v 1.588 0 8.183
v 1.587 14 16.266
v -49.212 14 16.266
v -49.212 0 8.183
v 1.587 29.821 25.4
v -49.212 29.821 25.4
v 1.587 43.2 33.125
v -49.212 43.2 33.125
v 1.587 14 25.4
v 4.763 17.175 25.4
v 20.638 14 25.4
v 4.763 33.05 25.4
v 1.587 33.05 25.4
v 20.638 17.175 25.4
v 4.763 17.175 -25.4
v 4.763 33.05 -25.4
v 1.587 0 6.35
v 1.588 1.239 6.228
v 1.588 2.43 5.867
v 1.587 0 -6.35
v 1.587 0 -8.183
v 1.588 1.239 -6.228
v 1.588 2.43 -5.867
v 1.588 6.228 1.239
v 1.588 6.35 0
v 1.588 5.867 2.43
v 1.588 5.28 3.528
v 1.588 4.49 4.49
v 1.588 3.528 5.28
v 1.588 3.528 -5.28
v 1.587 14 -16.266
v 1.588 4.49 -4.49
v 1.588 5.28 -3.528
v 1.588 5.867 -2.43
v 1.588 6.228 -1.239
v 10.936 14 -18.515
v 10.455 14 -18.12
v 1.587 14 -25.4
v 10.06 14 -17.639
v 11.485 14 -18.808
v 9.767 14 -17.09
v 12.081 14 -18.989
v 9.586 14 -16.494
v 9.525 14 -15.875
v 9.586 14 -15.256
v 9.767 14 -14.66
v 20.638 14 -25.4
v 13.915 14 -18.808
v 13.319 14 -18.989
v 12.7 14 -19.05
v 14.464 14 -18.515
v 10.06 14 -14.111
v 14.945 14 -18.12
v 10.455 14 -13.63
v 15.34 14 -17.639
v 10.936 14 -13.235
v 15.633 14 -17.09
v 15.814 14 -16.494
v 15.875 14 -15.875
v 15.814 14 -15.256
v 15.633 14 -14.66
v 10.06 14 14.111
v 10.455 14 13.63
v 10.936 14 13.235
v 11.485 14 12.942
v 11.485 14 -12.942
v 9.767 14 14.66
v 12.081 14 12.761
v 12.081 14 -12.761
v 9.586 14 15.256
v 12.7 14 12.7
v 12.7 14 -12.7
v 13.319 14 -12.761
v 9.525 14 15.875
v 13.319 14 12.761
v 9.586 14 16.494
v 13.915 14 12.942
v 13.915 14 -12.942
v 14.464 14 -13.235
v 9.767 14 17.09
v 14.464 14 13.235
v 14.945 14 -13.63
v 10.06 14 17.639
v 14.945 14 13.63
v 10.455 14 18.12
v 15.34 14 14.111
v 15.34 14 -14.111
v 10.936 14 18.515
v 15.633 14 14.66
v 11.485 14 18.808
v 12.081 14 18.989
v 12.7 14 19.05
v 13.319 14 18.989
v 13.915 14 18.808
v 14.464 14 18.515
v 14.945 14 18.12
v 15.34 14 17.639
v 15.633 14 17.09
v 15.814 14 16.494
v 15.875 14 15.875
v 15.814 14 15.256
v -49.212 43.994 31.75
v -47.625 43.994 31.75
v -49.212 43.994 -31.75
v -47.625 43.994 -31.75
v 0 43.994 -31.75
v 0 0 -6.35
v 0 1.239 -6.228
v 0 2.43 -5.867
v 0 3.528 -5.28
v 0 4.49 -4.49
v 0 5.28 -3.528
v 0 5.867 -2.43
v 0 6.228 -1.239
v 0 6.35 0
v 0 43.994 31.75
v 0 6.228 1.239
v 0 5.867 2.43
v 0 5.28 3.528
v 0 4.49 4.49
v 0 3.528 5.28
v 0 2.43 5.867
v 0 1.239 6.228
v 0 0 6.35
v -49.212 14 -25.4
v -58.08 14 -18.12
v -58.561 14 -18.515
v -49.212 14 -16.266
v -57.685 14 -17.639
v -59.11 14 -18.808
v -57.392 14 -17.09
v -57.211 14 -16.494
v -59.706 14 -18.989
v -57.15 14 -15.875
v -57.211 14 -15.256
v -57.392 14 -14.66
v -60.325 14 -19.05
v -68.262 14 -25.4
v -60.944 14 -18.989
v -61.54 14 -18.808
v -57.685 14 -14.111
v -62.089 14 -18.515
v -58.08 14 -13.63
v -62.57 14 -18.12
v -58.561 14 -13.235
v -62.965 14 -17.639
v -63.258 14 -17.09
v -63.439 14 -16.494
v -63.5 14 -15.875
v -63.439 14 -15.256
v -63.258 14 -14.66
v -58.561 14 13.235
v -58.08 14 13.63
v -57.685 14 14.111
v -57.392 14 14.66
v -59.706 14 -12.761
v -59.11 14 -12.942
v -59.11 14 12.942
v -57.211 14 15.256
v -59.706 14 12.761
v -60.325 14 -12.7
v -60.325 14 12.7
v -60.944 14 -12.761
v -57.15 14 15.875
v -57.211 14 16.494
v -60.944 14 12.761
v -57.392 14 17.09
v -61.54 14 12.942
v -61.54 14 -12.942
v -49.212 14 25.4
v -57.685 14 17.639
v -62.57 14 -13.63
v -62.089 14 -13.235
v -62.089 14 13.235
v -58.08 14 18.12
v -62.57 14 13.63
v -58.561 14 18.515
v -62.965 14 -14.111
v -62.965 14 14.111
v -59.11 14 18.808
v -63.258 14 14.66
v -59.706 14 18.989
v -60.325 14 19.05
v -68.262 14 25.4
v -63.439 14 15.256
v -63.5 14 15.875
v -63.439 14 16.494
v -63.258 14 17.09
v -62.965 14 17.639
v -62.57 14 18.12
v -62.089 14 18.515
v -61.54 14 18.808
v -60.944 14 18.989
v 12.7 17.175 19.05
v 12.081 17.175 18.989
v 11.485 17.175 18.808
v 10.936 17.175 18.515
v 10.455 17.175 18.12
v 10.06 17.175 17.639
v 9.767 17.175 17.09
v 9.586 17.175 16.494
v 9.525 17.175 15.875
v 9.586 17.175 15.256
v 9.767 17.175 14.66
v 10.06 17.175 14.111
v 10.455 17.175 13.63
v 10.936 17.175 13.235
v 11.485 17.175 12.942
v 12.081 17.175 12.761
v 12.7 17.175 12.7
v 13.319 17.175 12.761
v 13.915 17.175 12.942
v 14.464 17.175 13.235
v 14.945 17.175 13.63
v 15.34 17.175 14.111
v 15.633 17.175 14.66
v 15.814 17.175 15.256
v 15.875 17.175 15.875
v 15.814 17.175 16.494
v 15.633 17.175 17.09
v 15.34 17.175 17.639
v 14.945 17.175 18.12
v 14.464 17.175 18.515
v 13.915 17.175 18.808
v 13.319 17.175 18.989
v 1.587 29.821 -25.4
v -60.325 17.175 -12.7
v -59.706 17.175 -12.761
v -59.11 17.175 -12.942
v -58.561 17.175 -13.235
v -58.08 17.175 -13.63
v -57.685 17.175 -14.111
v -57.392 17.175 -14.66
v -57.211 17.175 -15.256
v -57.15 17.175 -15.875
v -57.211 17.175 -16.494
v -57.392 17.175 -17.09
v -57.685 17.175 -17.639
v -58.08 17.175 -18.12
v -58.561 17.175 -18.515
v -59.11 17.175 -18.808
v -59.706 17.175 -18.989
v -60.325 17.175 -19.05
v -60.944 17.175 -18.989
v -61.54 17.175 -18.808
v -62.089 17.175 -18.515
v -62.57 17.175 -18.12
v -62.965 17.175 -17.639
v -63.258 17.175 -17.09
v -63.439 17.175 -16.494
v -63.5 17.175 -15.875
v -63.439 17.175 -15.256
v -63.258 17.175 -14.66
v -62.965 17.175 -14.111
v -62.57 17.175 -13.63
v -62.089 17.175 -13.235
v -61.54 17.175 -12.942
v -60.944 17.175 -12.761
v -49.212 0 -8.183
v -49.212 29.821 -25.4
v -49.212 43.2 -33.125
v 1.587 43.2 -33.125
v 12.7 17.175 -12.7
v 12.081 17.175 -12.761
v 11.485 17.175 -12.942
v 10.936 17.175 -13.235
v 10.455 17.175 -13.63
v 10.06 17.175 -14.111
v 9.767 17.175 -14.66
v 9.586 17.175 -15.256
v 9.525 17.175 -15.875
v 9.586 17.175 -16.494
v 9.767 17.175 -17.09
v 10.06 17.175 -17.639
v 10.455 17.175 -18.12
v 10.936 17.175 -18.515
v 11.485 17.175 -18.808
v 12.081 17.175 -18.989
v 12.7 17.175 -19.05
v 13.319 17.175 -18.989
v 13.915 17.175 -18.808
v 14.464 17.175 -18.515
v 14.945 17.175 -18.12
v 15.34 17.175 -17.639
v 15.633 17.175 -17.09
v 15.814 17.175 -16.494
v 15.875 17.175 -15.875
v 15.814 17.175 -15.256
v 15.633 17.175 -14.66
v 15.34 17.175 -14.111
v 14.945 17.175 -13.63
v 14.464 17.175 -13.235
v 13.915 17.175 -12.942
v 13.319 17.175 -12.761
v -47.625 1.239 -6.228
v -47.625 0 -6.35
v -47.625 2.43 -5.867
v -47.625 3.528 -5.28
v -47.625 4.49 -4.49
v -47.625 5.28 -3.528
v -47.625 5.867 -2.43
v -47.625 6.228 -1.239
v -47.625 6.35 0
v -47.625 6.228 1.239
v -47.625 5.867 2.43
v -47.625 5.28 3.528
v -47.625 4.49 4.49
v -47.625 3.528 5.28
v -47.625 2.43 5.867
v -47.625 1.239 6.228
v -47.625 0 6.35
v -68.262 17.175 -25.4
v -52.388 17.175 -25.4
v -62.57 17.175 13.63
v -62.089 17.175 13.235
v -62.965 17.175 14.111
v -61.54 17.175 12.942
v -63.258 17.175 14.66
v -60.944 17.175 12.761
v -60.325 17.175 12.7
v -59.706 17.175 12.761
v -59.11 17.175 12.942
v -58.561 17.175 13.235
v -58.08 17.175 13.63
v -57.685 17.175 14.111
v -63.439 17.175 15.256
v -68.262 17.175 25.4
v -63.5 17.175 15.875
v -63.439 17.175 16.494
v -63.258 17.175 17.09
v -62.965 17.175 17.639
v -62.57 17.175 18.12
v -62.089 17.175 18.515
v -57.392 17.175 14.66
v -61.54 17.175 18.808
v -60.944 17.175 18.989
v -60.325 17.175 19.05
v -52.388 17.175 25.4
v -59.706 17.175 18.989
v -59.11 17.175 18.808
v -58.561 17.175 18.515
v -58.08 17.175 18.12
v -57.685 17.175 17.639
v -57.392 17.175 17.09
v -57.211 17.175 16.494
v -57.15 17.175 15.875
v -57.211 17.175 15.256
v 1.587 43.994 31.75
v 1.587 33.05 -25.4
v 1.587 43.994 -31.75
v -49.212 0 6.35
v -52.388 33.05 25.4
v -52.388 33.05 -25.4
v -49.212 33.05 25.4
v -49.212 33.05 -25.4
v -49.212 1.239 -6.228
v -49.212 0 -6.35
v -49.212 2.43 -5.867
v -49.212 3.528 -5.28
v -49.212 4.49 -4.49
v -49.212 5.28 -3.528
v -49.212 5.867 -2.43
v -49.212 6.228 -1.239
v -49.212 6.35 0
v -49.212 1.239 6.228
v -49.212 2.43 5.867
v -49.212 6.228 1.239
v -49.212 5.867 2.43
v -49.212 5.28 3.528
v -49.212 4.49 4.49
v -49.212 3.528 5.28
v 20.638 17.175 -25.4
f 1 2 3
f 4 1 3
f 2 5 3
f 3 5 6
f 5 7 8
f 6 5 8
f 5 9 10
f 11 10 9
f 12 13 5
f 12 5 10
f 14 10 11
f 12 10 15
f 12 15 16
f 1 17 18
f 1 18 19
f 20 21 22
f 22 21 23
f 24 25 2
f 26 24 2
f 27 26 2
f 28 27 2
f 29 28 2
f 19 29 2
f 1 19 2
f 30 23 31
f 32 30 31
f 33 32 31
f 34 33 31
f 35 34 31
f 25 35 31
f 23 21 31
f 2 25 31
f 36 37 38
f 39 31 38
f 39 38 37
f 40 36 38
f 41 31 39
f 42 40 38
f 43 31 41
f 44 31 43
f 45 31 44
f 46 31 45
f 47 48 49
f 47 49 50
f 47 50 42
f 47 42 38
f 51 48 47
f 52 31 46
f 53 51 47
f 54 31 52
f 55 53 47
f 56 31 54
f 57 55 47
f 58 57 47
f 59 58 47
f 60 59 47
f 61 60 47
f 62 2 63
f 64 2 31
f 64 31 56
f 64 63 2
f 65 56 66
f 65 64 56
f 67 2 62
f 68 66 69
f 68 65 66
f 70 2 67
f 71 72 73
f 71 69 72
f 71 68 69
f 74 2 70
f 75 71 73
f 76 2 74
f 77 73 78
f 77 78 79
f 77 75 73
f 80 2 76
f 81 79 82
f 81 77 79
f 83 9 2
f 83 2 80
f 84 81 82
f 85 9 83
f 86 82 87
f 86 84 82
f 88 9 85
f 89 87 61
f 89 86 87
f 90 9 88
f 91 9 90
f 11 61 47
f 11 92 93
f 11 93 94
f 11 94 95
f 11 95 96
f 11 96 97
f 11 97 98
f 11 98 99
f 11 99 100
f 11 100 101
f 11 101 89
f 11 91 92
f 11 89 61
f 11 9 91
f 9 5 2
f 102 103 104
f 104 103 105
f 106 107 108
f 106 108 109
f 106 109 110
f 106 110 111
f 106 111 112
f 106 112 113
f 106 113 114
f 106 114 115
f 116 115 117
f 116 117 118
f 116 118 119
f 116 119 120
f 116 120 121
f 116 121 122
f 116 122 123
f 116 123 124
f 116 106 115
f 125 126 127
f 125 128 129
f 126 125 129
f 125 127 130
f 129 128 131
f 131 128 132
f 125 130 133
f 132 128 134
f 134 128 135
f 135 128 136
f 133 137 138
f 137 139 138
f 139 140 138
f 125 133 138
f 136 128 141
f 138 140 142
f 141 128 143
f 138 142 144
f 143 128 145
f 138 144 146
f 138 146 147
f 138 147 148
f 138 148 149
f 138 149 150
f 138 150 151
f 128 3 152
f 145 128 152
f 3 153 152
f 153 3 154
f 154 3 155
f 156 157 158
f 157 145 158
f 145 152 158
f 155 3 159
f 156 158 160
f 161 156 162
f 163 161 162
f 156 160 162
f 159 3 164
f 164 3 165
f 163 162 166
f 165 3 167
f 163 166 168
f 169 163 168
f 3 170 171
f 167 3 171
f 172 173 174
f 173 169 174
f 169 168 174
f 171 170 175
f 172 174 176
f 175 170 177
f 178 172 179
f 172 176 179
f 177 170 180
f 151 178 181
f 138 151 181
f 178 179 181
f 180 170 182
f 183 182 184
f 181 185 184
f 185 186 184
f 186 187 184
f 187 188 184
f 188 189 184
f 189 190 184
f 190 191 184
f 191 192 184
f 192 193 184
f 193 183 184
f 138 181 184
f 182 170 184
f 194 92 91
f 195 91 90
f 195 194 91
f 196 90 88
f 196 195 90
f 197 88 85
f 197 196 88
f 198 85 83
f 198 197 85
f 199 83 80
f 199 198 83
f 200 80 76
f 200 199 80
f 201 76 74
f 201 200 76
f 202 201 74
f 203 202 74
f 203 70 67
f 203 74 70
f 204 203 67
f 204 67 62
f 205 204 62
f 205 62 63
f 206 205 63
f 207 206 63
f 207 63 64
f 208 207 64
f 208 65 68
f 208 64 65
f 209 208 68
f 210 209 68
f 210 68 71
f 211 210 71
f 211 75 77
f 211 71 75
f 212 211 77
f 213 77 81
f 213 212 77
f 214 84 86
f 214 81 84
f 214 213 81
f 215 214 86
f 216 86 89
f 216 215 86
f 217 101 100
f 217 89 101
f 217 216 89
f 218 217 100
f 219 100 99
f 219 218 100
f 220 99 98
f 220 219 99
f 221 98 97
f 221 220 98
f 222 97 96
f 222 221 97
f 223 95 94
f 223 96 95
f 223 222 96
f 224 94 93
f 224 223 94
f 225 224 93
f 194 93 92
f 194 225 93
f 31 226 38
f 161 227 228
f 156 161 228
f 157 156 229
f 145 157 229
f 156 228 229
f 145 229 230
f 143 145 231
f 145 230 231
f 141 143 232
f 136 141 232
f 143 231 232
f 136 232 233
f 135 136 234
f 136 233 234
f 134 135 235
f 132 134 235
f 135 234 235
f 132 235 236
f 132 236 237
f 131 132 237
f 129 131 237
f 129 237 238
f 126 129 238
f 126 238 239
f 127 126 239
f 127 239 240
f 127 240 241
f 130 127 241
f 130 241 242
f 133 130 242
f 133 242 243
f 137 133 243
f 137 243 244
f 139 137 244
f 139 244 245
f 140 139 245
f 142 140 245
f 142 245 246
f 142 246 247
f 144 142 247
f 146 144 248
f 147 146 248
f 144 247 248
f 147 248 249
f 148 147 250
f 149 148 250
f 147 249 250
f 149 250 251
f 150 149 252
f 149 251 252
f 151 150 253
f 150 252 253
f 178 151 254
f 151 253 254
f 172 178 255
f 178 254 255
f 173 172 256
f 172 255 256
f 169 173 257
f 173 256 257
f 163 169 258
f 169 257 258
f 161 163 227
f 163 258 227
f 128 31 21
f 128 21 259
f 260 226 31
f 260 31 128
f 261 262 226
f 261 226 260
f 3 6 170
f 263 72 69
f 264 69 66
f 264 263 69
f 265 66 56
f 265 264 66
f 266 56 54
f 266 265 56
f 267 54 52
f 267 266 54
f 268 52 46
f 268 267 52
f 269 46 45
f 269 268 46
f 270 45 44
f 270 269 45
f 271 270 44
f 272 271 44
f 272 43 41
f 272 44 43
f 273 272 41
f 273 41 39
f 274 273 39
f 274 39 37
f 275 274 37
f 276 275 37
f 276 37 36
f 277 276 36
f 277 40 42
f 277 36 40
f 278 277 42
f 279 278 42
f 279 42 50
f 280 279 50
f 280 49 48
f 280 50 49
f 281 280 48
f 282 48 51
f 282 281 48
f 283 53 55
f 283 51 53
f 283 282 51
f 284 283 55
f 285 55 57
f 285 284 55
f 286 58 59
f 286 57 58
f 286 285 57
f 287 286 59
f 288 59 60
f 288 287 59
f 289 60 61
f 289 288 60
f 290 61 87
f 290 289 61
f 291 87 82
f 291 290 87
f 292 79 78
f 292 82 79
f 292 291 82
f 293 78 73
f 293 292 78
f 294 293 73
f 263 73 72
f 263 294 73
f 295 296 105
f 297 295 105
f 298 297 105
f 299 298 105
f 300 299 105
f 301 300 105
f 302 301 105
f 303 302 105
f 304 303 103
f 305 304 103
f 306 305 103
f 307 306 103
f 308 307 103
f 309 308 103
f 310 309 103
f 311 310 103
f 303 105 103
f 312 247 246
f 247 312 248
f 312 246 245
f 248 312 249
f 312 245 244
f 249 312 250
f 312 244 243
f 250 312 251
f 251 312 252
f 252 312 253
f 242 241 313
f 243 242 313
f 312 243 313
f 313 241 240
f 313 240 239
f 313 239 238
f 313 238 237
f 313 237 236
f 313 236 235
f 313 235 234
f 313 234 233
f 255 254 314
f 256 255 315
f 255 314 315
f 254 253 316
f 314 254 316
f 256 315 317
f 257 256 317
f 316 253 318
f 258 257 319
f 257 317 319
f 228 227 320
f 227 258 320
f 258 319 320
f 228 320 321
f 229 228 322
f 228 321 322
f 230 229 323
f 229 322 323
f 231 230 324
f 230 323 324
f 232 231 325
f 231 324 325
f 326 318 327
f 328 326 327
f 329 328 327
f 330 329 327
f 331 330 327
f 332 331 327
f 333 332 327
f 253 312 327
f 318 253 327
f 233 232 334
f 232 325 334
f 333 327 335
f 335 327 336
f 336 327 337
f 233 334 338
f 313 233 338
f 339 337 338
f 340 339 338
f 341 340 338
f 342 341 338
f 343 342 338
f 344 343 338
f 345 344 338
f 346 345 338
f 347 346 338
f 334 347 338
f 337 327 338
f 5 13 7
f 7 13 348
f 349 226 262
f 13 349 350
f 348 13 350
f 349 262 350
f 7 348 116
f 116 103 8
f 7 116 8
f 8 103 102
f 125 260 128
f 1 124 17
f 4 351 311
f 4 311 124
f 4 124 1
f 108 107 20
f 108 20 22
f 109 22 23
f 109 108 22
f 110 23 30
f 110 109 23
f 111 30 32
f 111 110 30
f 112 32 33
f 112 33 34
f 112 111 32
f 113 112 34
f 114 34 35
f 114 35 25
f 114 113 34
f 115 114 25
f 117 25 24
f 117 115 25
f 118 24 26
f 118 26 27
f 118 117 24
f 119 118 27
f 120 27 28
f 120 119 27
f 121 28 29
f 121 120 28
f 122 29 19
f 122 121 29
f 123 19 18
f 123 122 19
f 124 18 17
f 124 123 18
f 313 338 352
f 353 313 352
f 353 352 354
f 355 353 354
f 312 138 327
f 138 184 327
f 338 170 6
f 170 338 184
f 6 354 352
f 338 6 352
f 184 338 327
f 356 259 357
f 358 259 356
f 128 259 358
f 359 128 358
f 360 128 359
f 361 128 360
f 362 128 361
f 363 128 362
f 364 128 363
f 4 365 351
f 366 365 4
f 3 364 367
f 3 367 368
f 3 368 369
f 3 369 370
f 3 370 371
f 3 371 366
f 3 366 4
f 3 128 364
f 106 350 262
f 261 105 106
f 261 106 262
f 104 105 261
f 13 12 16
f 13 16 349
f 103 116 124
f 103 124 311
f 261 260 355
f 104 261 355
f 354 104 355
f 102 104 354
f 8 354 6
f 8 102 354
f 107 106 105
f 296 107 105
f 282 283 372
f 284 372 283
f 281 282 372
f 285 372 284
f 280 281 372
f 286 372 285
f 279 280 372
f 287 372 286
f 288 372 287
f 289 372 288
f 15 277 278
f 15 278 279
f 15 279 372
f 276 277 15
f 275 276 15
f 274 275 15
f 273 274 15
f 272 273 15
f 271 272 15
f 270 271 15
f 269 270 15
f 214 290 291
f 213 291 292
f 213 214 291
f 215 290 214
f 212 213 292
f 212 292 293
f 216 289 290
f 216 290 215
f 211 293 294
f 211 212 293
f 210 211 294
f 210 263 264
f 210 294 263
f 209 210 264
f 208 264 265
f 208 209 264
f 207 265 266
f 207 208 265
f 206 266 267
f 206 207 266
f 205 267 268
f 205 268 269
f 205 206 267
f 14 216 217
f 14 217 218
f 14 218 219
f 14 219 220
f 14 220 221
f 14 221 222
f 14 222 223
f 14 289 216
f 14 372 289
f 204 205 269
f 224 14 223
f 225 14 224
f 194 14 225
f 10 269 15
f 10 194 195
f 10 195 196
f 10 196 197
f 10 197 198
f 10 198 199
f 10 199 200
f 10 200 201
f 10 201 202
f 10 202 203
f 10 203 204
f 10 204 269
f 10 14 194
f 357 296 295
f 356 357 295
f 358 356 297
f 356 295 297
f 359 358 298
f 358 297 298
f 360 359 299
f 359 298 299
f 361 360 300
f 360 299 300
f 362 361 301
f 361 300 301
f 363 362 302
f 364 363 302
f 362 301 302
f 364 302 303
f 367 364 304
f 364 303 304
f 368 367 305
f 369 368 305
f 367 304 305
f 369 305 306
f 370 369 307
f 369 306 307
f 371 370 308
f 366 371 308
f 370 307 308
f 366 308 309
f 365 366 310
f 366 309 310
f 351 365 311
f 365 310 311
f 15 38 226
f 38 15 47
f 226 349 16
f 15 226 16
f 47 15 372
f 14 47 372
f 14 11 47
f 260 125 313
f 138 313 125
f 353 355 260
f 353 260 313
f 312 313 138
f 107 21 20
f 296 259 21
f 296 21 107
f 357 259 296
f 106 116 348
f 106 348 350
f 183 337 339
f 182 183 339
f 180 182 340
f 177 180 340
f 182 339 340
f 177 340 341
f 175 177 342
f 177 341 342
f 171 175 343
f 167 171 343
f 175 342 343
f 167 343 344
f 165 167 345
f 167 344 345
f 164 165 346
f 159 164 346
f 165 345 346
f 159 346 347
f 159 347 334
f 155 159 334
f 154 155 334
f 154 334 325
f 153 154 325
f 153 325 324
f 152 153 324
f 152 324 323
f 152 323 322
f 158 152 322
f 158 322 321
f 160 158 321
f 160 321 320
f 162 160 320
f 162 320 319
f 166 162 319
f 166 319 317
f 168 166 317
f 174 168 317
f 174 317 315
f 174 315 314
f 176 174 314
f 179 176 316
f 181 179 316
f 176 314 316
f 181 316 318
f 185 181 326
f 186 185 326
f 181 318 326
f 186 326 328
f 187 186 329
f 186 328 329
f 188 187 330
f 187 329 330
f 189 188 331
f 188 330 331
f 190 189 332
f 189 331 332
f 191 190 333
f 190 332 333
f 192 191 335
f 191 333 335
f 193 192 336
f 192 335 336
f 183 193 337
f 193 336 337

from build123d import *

# Parameters (mm, degrees)
BOSS_EXTRUDE1_DEPTH = 1.5875
SKETCH2_W           = 50.8
SKETCH2_H           = 50.8
BOSS_EXTRUDE2_DEPTH = 1.5875
SKETCH3_W           = 16.36617421
SKETCH3_H           = 0.79375
CUT_EXTRUDE1_DEPTH  = 75.922449176
BOSS_EXTRUDE3_DEPTH = 25.4
SKETCH6_R           = 3.175
CUT_EXTRUDE3_DEPTH  = 81.475374573


with BuildPart() as part:
    # Sketch1 → Boss-Extrude1 (new body)
    with BuildSketch(Plane(origin=(0, 0, 0), x_dir=(0, 0, -1), z_dir=(1, 0, 0))):
        with BuildLine():
            Line((-6.35, 0), (-31.75, 43.994090512))
            Line((-31.75, 43.994090512), (31.75, 43.994090512))
            Line((31.75, 43.994090512), (6.35, 0))
            ThreePointArc((6.35, 0), (0, 6.35), (-6.35, 0))
        make_face()
    boss_extrude1 = extrude(amount=BOSS_EXTRUDE1_DEPTH)

    # Sketch2 → Boss-Extrude2 (add)
    with BuildSketch(Plane(origin=(0, -2.749630657, -4.7625), x_dir=(-1, 0, 0), z_dir=(0, -0.499999999999998, -0.8660254037844397))):
        with Locations((23.8125, 28.575)):
            Rectangle(SKETCH2_W, SKETCH2_H)
    boss_extrude2 = extrude(amount=BOSS_EXTRUDE2_DEPTH)

    # Mirror1: Boss-Extrude2 across plane
    add(boss_extrude2.mirror(Plane.XY))

    # Mirror2: Boss-Extrude1 across plane
    add(boss_extrude1.mirror(Plane(origin=(-23.8125, 0, 0), x_dir=(0, 0, 1), z_dir=(1, 0, 0))))

    # Sketch3 → Cut-Extrude1 (cut, through all)
    with BuildSketch(Plane.ZY.offset(49.2125)):
        with Locations((0, -0.396875)):
            Rectangle(SKETCH3_W, SKETCH3_H)
    extrude(amount=-CUT_EXTRUDE1_DEPTH, mode=Mode.SUBTRACT)

    # Sketch4 → Boss-Extrude3 (add, symmetric)
    with BuildSketch(Plane.XY):
        Polygon((-49.2125, 33.05), (-49.2125, 14), (-68.2625, 14), (-68.2625, 17.175), (-52.3875, 17.175), (-52.3875, 33.05), align=None)
    boss_extrude3 = extrude(amount=BOSS_EXTRUDE3_DEPTH, both=True)

    # Sketch6 → Cut-Extrude3 (cut, through all)
    with BuildSketch(Plane(origin=(0, 17.175, 0), x_dir=(1, 0, 0), z_dir=(0, 1, 0))):
        with Locations(Location((-60.325, 15.875, 0), (0, 0, 270))):
            Circle(SKETCH6_R)
        with Locations(Location((-60.325, -15.875, 0), (0, 0, 270))):
            Circle(SKETCH6_R)
    cut_extrude3 = extrude(amount=-CUT_EXTRUDE3_DEPTH, mode=Mode.SUBTRACT)

    # Mirror3: Boss-Extrude3, Cut-Extrude3 across plane
    add(boss_extrude3.mirror(Plane(origin=(-23.8125, 0, 0), x_dir=(0, 0, 1), z_dir=(1, 0, 0))))
    add(cut_extrude3.mirror(Plane(origin=(-23.8125, 0, 0), x_dir=(0, 0, 1), z_dir=(1, 0, 0))), mode=Mode.SUBTRACT)


solid = part.part
